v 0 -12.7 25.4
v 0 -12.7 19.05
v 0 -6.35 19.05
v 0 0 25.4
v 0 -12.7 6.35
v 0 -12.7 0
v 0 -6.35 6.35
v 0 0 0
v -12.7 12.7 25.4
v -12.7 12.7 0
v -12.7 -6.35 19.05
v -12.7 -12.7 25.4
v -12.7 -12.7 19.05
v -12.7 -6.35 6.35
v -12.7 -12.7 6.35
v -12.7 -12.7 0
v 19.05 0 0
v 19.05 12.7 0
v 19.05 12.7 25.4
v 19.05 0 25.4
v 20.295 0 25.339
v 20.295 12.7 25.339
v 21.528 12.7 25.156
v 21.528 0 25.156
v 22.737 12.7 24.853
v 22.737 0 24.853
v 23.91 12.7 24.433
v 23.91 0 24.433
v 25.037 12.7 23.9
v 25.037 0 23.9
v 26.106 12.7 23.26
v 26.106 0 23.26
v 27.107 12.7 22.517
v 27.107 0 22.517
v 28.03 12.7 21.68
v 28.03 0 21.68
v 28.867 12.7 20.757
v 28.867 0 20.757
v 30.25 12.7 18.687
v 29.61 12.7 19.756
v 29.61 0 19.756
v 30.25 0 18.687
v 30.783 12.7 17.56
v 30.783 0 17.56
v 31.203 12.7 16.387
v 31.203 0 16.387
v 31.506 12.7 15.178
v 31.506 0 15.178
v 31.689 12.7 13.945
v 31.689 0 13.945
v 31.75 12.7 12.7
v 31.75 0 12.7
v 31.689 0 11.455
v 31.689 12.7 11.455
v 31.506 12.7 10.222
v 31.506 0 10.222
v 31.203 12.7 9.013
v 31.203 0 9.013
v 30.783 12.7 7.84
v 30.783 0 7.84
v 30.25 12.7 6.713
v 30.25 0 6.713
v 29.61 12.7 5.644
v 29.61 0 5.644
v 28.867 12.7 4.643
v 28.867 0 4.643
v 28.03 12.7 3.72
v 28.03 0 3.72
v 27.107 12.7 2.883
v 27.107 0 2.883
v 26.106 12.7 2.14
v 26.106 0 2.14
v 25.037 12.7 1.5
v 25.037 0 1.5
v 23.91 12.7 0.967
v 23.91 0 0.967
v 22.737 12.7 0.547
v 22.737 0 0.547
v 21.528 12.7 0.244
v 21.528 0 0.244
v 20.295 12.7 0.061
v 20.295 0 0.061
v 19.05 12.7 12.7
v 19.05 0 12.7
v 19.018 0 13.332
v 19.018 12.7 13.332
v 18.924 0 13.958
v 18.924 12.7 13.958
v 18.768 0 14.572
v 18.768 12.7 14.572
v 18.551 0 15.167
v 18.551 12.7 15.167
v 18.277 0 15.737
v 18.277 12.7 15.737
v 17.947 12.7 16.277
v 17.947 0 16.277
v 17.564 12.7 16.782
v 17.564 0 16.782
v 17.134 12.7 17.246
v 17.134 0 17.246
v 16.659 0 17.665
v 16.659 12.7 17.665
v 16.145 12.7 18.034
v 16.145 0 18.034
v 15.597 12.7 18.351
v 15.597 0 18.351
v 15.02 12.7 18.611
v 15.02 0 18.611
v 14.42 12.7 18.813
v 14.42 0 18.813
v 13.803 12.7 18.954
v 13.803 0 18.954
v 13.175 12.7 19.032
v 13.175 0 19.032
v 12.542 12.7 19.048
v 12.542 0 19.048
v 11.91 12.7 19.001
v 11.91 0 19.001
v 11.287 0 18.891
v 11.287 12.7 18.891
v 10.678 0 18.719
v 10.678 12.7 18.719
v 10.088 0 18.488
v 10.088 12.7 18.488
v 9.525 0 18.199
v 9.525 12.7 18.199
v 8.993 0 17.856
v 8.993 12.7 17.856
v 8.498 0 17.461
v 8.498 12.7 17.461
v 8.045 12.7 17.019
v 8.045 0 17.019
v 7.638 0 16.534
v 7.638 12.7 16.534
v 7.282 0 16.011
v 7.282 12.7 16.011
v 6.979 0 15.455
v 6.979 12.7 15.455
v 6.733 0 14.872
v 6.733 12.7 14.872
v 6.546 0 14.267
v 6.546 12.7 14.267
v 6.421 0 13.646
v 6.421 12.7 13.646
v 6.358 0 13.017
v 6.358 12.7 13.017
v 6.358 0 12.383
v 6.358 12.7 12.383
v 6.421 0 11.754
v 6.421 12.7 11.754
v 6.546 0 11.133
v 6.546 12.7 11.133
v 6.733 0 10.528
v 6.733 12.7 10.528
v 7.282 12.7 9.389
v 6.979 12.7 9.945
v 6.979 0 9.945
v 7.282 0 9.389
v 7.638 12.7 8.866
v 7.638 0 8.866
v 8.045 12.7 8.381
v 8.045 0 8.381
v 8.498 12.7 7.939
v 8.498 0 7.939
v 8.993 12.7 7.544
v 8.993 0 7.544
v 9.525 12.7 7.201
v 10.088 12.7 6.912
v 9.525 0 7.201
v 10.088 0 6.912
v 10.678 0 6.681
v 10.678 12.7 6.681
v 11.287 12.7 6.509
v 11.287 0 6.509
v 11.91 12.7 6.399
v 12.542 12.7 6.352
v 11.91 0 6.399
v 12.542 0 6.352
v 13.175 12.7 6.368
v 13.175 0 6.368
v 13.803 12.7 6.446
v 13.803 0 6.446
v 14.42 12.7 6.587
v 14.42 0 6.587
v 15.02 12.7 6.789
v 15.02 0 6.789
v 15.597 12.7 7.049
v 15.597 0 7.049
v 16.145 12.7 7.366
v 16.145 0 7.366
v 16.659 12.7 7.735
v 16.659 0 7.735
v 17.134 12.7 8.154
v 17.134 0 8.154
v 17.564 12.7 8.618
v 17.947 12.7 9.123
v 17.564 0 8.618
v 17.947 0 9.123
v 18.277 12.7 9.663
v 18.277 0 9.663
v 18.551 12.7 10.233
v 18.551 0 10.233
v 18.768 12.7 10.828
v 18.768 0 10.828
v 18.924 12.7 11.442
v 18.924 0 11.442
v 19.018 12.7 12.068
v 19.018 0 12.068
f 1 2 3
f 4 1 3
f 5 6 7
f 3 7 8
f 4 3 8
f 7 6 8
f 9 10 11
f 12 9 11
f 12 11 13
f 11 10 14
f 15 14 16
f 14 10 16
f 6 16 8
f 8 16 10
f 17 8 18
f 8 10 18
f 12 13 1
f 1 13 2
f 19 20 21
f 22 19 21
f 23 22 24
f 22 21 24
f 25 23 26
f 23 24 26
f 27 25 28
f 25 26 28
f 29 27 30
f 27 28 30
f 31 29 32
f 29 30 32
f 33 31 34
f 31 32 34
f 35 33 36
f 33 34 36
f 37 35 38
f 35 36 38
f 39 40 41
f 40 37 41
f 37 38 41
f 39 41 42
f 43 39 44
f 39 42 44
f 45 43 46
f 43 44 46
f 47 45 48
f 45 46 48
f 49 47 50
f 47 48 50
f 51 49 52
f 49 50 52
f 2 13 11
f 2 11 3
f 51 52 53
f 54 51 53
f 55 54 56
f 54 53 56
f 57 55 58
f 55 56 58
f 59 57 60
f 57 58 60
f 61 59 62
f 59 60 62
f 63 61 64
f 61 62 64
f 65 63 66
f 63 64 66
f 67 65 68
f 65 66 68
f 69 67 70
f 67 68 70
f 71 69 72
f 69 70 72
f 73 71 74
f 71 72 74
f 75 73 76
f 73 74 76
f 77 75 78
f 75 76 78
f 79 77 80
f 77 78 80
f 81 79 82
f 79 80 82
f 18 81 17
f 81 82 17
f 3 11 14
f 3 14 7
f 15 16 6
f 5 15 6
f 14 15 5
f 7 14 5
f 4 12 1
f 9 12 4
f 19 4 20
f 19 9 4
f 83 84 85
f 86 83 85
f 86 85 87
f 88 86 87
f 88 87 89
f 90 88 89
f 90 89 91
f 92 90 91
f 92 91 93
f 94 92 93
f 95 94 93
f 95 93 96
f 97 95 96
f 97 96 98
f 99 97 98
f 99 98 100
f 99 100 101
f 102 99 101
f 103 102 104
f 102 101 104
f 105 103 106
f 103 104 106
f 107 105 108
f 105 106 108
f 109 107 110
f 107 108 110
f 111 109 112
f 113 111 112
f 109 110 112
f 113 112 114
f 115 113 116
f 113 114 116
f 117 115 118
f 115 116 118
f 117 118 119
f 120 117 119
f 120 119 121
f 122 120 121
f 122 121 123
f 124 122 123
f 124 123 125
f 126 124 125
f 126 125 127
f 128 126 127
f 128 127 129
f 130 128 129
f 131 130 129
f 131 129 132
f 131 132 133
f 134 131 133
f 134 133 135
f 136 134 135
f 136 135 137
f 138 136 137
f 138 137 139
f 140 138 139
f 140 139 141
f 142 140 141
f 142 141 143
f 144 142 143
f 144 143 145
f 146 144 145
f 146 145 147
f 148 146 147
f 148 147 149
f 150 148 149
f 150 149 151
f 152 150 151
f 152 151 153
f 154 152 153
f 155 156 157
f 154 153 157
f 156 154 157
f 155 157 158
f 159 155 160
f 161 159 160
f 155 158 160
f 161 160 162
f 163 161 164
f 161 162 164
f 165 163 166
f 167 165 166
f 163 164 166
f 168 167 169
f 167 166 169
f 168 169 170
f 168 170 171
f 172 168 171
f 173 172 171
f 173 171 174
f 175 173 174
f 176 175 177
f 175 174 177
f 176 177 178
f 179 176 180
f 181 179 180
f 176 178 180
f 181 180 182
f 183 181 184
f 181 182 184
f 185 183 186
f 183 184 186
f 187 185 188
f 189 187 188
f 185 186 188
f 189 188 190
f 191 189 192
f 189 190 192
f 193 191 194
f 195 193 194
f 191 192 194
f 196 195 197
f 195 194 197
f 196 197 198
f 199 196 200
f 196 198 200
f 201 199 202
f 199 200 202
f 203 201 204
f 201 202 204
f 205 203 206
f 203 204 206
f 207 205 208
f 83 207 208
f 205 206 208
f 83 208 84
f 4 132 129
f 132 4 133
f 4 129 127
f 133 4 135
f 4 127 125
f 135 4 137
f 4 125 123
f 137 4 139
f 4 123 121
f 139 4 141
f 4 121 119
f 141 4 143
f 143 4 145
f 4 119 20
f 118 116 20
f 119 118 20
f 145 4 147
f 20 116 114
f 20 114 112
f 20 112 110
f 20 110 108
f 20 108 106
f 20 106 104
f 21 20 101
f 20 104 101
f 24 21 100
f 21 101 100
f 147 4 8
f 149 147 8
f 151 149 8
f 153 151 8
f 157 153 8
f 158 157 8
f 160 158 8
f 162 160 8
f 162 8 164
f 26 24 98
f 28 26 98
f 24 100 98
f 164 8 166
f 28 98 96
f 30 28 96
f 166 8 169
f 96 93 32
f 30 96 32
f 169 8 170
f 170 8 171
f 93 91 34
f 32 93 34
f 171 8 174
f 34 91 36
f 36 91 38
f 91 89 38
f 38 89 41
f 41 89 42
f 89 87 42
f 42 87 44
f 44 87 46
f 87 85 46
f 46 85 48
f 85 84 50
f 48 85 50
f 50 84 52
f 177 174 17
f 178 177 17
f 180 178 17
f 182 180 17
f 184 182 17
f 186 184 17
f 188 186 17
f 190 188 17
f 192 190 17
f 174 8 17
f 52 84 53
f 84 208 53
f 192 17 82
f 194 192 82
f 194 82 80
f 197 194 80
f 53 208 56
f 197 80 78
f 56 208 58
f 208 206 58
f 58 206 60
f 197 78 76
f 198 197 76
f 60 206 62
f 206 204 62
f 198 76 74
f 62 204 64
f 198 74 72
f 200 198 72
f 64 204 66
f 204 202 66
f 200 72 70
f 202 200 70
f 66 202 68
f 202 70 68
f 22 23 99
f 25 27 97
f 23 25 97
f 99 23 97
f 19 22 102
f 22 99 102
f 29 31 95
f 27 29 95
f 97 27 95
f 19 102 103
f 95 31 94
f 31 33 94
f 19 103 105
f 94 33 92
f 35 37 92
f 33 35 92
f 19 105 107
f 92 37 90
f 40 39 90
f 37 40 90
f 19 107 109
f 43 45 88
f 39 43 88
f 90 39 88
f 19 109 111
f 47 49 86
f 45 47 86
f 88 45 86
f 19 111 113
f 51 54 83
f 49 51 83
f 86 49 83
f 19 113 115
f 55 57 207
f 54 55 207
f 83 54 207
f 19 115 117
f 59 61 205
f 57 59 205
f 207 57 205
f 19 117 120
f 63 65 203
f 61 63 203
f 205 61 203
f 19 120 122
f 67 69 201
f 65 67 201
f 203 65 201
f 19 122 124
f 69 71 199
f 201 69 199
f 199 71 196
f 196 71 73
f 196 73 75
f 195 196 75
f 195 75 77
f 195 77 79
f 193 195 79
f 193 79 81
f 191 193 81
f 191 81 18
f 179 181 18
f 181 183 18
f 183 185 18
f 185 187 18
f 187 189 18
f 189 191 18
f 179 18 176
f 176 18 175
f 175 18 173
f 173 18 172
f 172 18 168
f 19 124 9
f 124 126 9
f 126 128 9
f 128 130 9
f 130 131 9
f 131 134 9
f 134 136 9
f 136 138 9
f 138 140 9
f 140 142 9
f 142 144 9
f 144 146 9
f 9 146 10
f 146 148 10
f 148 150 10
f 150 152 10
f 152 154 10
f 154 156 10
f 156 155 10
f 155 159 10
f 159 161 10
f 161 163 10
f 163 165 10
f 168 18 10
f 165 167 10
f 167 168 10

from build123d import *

# Parameters (mm, degrees)
F1_DEPTH = 25.4
F2_W     = 12.7
F2_H     = 12.7
F3_DEPTH = 6.35
F5_DEPTH = 25.4
F6_R     = 6.35
F7_DEPTH = 25.4


with BuildPart() as f1:
    # F0 (on Top) → F1 (new body)
    with BuildSketch(Plane.XY):
        Polygon((0, -12.7), (0, 0), (31.75, 0), (31.75, 12.7), (-12.7, 12.7), (-12.7, -12.7), align=None)
    extrude(amount=F1_DEPTH)

    # F2 (on face) → F3 (cut)
    with BuildSketch(Plane.XZ.offset(12.7)):
        with Locations((-6.35, 12.7)):
            Rectangle(F2_W, F2_H)
    extrude(amount=-F3_DEPTH, mode=Mode.SUBTRACT)

    # F4 (on face) → F5 (cut)
    with BuildSketch(Plane.XZ):
        with BuildLine():
            ThreePointArc((19.05, 25.4), (28.030256, 21.680256), (31.75, 12.7))
            Line((31.75, 12.7), (31.75, 25.4))
            Line((31.75, 25.4), (19.05, 25.4))
        make_face()
        with BuildLine():
            ThreePointArc((31.75, 12.7), (28.030256, 3.719744), (19.05, 0))
            Line((19.05, 0), (31.75, 0))
            Line((31.75, 0), (31.75, 12.7))
        make_face()
    extrude(amount=-F5_DEPTH, mode=Mode.SUBTRACT)

    # F6 (on face) → F7 (cut)
    with BuildSketch(Plane.XZ):
        with Locations((12.7, 12.7)):
            Circle(F6_R)
    extrude(amount=-F7_DEPTH, mode=Mode.SUBTRACT)


solid = f1.part
